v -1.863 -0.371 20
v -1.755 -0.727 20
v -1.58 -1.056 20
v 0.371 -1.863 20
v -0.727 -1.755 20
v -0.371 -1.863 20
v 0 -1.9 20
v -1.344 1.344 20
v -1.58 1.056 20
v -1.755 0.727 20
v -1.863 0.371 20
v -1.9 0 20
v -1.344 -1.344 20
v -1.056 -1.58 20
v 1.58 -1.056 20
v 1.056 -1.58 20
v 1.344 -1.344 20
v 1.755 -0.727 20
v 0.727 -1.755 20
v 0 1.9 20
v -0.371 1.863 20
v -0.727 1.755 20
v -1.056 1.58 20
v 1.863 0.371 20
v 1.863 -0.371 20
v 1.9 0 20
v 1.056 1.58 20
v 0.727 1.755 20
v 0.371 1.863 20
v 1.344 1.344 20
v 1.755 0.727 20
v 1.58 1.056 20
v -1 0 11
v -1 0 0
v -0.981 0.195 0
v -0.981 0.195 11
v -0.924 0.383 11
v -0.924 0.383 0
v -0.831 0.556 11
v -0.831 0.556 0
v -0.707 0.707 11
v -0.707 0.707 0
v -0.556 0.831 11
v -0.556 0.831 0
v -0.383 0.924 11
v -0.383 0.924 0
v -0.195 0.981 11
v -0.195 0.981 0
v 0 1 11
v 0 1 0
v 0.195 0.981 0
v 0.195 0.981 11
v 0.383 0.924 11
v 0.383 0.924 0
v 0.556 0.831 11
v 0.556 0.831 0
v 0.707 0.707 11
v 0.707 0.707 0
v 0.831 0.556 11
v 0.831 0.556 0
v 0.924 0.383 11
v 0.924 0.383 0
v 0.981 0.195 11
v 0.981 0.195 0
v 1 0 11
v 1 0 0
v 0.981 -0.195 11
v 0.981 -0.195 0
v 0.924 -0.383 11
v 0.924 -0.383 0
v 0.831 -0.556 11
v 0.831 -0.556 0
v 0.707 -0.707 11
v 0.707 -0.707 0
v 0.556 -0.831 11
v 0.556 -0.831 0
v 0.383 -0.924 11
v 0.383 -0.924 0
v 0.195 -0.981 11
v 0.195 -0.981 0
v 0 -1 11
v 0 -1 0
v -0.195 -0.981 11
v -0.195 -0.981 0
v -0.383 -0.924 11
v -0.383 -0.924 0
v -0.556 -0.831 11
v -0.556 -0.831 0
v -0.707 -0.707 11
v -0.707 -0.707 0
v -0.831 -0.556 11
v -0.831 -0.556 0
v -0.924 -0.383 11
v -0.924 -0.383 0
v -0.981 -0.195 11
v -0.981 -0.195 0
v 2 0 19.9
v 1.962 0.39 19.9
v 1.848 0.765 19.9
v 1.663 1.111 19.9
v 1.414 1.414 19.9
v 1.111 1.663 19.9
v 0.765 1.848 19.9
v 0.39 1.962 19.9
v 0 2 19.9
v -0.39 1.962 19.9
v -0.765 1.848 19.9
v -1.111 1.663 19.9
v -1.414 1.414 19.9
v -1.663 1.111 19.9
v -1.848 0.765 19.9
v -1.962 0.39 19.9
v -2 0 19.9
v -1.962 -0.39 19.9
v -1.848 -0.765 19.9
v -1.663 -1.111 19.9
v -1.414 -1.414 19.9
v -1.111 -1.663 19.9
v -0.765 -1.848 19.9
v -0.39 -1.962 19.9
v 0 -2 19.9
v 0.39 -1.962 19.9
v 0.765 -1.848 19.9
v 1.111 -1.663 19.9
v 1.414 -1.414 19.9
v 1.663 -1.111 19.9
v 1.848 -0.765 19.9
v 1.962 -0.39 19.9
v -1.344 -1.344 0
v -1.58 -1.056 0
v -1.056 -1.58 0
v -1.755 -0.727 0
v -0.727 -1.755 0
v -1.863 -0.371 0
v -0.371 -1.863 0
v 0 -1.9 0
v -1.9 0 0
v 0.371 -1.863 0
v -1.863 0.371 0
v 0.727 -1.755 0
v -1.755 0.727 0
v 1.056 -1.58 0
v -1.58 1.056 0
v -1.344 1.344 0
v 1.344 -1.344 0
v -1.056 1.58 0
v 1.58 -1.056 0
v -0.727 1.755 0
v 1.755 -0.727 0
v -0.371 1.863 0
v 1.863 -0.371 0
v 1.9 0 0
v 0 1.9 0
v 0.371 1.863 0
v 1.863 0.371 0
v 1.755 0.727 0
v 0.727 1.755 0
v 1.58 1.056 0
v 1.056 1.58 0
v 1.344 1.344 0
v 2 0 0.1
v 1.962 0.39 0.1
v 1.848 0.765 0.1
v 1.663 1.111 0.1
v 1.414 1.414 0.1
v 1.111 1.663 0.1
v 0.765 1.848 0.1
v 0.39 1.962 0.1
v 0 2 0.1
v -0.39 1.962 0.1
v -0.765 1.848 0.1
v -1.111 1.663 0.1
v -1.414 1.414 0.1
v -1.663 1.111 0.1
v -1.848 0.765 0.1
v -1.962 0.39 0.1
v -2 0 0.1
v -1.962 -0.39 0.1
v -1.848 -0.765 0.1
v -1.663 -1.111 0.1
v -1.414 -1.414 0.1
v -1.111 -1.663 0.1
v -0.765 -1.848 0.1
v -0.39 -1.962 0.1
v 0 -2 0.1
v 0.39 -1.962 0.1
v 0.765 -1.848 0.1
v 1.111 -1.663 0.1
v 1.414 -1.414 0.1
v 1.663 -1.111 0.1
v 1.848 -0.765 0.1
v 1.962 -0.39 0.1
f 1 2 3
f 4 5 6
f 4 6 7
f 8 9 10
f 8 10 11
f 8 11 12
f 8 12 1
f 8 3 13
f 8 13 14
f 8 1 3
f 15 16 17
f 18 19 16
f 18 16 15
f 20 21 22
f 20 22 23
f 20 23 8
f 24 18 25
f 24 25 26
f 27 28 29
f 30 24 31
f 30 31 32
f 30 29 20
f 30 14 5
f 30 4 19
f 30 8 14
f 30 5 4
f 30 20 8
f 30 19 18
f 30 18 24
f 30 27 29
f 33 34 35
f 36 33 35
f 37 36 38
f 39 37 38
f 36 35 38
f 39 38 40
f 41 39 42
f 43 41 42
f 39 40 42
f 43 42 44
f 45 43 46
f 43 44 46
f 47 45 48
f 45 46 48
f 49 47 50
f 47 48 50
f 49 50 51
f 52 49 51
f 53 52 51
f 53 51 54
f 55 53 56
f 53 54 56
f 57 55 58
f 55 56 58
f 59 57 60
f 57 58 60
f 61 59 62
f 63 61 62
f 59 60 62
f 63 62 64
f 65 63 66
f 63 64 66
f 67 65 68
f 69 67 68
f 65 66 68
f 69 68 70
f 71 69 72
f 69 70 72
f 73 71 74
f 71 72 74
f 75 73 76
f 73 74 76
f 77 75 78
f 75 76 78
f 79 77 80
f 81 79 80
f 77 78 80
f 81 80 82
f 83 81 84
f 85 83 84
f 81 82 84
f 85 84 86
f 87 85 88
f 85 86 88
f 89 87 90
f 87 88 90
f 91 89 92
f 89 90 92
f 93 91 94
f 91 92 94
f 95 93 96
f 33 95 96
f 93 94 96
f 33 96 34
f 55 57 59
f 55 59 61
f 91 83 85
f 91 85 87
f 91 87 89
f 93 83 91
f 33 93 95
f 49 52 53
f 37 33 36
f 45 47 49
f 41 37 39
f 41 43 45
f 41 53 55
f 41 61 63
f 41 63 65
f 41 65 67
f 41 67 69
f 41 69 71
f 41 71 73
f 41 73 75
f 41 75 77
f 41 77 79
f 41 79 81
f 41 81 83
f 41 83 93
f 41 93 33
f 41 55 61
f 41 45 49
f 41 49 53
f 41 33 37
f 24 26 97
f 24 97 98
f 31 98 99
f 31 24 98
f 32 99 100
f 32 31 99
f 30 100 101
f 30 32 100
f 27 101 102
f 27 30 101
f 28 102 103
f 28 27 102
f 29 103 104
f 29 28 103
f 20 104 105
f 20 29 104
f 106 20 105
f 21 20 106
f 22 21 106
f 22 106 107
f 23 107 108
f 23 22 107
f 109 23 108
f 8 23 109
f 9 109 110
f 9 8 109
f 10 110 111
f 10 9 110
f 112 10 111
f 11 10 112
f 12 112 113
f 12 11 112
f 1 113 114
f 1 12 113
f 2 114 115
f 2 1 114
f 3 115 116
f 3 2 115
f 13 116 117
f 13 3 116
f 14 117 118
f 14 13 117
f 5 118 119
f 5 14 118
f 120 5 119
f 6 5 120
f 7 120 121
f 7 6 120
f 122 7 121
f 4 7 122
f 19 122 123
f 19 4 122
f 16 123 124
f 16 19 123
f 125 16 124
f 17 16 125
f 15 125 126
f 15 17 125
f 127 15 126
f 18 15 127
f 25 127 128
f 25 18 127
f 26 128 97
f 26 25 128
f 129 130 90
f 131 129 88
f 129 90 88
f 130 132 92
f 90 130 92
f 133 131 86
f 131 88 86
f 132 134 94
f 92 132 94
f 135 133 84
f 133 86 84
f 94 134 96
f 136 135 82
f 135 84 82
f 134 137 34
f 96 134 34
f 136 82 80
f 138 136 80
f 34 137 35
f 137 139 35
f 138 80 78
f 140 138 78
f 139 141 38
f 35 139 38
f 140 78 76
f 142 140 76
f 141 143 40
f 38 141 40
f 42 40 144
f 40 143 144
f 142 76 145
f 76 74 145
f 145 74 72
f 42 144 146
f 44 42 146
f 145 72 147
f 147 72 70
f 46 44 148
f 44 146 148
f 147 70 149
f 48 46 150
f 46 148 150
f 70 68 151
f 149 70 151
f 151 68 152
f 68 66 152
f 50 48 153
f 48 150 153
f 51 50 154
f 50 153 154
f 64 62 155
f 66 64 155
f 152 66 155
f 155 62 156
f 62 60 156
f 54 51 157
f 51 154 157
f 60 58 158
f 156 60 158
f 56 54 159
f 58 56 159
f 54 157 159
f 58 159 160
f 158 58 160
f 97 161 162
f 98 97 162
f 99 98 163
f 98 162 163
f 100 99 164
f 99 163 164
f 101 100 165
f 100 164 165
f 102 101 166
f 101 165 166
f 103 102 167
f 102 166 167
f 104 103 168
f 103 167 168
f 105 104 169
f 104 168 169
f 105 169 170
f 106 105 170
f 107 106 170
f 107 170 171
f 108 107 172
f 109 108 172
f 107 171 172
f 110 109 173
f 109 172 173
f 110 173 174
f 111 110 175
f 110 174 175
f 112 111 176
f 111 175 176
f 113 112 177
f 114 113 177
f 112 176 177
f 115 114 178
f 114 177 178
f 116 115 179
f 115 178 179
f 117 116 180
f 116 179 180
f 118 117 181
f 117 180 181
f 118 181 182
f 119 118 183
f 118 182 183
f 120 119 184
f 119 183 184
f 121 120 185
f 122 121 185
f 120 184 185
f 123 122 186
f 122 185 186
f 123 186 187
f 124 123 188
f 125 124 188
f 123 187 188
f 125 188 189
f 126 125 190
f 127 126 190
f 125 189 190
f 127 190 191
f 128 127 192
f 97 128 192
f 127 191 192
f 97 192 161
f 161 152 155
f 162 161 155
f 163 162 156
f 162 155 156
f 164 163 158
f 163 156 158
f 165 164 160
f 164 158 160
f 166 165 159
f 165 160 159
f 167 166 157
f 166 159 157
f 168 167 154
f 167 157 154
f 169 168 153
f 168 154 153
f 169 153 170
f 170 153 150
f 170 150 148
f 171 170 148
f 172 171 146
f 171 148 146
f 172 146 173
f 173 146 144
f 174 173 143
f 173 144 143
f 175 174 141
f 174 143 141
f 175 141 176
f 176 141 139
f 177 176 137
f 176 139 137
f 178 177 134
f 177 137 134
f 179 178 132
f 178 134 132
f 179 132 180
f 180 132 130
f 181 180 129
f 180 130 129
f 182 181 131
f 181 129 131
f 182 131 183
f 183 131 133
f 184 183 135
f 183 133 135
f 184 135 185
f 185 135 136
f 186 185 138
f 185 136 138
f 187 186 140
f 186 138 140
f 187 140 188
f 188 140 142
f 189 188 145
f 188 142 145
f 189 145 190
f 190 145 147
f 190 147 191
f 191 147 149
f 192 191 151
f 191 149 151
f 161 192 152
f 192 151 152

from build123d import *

# Parameters (mm, degrees)
SKETCH_1_R          = 2
EXTRUDE_1_DEPTH     = 20
SKETCH_2_R          = 1
CUT_EXTRUDE_1_DEPTH = 11
CHAMFER_1_SIZE      = 0.1


with BuildPart() as part:
    # 草图1 → 凸台-拉伸1 (new body)
    with BuildSketch(Plane.XY):
        Circle(SKETCH_1_R)
    extrude(amount=EXTRUDE_1_DEPTH)

    # 草图2 → 切除-拉伸1 (cut)
    with BuildSketch(Plane(origin=(0, 0, 0), x_dir=(-1, 0, 0), z_dir=(0, 0, -1))):
        Circle(SKETCH_2_R)
    extrude(amount=-CUT_EXTRUDE_1_DEPTH, mode=Mode.SUBTRACT)

    # 倒角1
    chamfer_1_edges = [part.edges().sort_by_distance(p)[0] for p in [
        (-2, 0, 0),
        (-2, 0, 20),
    ]]
    chamfer(chamfer_1_edges, length=CHAMFER_1_SIZE)


solid = part.part
